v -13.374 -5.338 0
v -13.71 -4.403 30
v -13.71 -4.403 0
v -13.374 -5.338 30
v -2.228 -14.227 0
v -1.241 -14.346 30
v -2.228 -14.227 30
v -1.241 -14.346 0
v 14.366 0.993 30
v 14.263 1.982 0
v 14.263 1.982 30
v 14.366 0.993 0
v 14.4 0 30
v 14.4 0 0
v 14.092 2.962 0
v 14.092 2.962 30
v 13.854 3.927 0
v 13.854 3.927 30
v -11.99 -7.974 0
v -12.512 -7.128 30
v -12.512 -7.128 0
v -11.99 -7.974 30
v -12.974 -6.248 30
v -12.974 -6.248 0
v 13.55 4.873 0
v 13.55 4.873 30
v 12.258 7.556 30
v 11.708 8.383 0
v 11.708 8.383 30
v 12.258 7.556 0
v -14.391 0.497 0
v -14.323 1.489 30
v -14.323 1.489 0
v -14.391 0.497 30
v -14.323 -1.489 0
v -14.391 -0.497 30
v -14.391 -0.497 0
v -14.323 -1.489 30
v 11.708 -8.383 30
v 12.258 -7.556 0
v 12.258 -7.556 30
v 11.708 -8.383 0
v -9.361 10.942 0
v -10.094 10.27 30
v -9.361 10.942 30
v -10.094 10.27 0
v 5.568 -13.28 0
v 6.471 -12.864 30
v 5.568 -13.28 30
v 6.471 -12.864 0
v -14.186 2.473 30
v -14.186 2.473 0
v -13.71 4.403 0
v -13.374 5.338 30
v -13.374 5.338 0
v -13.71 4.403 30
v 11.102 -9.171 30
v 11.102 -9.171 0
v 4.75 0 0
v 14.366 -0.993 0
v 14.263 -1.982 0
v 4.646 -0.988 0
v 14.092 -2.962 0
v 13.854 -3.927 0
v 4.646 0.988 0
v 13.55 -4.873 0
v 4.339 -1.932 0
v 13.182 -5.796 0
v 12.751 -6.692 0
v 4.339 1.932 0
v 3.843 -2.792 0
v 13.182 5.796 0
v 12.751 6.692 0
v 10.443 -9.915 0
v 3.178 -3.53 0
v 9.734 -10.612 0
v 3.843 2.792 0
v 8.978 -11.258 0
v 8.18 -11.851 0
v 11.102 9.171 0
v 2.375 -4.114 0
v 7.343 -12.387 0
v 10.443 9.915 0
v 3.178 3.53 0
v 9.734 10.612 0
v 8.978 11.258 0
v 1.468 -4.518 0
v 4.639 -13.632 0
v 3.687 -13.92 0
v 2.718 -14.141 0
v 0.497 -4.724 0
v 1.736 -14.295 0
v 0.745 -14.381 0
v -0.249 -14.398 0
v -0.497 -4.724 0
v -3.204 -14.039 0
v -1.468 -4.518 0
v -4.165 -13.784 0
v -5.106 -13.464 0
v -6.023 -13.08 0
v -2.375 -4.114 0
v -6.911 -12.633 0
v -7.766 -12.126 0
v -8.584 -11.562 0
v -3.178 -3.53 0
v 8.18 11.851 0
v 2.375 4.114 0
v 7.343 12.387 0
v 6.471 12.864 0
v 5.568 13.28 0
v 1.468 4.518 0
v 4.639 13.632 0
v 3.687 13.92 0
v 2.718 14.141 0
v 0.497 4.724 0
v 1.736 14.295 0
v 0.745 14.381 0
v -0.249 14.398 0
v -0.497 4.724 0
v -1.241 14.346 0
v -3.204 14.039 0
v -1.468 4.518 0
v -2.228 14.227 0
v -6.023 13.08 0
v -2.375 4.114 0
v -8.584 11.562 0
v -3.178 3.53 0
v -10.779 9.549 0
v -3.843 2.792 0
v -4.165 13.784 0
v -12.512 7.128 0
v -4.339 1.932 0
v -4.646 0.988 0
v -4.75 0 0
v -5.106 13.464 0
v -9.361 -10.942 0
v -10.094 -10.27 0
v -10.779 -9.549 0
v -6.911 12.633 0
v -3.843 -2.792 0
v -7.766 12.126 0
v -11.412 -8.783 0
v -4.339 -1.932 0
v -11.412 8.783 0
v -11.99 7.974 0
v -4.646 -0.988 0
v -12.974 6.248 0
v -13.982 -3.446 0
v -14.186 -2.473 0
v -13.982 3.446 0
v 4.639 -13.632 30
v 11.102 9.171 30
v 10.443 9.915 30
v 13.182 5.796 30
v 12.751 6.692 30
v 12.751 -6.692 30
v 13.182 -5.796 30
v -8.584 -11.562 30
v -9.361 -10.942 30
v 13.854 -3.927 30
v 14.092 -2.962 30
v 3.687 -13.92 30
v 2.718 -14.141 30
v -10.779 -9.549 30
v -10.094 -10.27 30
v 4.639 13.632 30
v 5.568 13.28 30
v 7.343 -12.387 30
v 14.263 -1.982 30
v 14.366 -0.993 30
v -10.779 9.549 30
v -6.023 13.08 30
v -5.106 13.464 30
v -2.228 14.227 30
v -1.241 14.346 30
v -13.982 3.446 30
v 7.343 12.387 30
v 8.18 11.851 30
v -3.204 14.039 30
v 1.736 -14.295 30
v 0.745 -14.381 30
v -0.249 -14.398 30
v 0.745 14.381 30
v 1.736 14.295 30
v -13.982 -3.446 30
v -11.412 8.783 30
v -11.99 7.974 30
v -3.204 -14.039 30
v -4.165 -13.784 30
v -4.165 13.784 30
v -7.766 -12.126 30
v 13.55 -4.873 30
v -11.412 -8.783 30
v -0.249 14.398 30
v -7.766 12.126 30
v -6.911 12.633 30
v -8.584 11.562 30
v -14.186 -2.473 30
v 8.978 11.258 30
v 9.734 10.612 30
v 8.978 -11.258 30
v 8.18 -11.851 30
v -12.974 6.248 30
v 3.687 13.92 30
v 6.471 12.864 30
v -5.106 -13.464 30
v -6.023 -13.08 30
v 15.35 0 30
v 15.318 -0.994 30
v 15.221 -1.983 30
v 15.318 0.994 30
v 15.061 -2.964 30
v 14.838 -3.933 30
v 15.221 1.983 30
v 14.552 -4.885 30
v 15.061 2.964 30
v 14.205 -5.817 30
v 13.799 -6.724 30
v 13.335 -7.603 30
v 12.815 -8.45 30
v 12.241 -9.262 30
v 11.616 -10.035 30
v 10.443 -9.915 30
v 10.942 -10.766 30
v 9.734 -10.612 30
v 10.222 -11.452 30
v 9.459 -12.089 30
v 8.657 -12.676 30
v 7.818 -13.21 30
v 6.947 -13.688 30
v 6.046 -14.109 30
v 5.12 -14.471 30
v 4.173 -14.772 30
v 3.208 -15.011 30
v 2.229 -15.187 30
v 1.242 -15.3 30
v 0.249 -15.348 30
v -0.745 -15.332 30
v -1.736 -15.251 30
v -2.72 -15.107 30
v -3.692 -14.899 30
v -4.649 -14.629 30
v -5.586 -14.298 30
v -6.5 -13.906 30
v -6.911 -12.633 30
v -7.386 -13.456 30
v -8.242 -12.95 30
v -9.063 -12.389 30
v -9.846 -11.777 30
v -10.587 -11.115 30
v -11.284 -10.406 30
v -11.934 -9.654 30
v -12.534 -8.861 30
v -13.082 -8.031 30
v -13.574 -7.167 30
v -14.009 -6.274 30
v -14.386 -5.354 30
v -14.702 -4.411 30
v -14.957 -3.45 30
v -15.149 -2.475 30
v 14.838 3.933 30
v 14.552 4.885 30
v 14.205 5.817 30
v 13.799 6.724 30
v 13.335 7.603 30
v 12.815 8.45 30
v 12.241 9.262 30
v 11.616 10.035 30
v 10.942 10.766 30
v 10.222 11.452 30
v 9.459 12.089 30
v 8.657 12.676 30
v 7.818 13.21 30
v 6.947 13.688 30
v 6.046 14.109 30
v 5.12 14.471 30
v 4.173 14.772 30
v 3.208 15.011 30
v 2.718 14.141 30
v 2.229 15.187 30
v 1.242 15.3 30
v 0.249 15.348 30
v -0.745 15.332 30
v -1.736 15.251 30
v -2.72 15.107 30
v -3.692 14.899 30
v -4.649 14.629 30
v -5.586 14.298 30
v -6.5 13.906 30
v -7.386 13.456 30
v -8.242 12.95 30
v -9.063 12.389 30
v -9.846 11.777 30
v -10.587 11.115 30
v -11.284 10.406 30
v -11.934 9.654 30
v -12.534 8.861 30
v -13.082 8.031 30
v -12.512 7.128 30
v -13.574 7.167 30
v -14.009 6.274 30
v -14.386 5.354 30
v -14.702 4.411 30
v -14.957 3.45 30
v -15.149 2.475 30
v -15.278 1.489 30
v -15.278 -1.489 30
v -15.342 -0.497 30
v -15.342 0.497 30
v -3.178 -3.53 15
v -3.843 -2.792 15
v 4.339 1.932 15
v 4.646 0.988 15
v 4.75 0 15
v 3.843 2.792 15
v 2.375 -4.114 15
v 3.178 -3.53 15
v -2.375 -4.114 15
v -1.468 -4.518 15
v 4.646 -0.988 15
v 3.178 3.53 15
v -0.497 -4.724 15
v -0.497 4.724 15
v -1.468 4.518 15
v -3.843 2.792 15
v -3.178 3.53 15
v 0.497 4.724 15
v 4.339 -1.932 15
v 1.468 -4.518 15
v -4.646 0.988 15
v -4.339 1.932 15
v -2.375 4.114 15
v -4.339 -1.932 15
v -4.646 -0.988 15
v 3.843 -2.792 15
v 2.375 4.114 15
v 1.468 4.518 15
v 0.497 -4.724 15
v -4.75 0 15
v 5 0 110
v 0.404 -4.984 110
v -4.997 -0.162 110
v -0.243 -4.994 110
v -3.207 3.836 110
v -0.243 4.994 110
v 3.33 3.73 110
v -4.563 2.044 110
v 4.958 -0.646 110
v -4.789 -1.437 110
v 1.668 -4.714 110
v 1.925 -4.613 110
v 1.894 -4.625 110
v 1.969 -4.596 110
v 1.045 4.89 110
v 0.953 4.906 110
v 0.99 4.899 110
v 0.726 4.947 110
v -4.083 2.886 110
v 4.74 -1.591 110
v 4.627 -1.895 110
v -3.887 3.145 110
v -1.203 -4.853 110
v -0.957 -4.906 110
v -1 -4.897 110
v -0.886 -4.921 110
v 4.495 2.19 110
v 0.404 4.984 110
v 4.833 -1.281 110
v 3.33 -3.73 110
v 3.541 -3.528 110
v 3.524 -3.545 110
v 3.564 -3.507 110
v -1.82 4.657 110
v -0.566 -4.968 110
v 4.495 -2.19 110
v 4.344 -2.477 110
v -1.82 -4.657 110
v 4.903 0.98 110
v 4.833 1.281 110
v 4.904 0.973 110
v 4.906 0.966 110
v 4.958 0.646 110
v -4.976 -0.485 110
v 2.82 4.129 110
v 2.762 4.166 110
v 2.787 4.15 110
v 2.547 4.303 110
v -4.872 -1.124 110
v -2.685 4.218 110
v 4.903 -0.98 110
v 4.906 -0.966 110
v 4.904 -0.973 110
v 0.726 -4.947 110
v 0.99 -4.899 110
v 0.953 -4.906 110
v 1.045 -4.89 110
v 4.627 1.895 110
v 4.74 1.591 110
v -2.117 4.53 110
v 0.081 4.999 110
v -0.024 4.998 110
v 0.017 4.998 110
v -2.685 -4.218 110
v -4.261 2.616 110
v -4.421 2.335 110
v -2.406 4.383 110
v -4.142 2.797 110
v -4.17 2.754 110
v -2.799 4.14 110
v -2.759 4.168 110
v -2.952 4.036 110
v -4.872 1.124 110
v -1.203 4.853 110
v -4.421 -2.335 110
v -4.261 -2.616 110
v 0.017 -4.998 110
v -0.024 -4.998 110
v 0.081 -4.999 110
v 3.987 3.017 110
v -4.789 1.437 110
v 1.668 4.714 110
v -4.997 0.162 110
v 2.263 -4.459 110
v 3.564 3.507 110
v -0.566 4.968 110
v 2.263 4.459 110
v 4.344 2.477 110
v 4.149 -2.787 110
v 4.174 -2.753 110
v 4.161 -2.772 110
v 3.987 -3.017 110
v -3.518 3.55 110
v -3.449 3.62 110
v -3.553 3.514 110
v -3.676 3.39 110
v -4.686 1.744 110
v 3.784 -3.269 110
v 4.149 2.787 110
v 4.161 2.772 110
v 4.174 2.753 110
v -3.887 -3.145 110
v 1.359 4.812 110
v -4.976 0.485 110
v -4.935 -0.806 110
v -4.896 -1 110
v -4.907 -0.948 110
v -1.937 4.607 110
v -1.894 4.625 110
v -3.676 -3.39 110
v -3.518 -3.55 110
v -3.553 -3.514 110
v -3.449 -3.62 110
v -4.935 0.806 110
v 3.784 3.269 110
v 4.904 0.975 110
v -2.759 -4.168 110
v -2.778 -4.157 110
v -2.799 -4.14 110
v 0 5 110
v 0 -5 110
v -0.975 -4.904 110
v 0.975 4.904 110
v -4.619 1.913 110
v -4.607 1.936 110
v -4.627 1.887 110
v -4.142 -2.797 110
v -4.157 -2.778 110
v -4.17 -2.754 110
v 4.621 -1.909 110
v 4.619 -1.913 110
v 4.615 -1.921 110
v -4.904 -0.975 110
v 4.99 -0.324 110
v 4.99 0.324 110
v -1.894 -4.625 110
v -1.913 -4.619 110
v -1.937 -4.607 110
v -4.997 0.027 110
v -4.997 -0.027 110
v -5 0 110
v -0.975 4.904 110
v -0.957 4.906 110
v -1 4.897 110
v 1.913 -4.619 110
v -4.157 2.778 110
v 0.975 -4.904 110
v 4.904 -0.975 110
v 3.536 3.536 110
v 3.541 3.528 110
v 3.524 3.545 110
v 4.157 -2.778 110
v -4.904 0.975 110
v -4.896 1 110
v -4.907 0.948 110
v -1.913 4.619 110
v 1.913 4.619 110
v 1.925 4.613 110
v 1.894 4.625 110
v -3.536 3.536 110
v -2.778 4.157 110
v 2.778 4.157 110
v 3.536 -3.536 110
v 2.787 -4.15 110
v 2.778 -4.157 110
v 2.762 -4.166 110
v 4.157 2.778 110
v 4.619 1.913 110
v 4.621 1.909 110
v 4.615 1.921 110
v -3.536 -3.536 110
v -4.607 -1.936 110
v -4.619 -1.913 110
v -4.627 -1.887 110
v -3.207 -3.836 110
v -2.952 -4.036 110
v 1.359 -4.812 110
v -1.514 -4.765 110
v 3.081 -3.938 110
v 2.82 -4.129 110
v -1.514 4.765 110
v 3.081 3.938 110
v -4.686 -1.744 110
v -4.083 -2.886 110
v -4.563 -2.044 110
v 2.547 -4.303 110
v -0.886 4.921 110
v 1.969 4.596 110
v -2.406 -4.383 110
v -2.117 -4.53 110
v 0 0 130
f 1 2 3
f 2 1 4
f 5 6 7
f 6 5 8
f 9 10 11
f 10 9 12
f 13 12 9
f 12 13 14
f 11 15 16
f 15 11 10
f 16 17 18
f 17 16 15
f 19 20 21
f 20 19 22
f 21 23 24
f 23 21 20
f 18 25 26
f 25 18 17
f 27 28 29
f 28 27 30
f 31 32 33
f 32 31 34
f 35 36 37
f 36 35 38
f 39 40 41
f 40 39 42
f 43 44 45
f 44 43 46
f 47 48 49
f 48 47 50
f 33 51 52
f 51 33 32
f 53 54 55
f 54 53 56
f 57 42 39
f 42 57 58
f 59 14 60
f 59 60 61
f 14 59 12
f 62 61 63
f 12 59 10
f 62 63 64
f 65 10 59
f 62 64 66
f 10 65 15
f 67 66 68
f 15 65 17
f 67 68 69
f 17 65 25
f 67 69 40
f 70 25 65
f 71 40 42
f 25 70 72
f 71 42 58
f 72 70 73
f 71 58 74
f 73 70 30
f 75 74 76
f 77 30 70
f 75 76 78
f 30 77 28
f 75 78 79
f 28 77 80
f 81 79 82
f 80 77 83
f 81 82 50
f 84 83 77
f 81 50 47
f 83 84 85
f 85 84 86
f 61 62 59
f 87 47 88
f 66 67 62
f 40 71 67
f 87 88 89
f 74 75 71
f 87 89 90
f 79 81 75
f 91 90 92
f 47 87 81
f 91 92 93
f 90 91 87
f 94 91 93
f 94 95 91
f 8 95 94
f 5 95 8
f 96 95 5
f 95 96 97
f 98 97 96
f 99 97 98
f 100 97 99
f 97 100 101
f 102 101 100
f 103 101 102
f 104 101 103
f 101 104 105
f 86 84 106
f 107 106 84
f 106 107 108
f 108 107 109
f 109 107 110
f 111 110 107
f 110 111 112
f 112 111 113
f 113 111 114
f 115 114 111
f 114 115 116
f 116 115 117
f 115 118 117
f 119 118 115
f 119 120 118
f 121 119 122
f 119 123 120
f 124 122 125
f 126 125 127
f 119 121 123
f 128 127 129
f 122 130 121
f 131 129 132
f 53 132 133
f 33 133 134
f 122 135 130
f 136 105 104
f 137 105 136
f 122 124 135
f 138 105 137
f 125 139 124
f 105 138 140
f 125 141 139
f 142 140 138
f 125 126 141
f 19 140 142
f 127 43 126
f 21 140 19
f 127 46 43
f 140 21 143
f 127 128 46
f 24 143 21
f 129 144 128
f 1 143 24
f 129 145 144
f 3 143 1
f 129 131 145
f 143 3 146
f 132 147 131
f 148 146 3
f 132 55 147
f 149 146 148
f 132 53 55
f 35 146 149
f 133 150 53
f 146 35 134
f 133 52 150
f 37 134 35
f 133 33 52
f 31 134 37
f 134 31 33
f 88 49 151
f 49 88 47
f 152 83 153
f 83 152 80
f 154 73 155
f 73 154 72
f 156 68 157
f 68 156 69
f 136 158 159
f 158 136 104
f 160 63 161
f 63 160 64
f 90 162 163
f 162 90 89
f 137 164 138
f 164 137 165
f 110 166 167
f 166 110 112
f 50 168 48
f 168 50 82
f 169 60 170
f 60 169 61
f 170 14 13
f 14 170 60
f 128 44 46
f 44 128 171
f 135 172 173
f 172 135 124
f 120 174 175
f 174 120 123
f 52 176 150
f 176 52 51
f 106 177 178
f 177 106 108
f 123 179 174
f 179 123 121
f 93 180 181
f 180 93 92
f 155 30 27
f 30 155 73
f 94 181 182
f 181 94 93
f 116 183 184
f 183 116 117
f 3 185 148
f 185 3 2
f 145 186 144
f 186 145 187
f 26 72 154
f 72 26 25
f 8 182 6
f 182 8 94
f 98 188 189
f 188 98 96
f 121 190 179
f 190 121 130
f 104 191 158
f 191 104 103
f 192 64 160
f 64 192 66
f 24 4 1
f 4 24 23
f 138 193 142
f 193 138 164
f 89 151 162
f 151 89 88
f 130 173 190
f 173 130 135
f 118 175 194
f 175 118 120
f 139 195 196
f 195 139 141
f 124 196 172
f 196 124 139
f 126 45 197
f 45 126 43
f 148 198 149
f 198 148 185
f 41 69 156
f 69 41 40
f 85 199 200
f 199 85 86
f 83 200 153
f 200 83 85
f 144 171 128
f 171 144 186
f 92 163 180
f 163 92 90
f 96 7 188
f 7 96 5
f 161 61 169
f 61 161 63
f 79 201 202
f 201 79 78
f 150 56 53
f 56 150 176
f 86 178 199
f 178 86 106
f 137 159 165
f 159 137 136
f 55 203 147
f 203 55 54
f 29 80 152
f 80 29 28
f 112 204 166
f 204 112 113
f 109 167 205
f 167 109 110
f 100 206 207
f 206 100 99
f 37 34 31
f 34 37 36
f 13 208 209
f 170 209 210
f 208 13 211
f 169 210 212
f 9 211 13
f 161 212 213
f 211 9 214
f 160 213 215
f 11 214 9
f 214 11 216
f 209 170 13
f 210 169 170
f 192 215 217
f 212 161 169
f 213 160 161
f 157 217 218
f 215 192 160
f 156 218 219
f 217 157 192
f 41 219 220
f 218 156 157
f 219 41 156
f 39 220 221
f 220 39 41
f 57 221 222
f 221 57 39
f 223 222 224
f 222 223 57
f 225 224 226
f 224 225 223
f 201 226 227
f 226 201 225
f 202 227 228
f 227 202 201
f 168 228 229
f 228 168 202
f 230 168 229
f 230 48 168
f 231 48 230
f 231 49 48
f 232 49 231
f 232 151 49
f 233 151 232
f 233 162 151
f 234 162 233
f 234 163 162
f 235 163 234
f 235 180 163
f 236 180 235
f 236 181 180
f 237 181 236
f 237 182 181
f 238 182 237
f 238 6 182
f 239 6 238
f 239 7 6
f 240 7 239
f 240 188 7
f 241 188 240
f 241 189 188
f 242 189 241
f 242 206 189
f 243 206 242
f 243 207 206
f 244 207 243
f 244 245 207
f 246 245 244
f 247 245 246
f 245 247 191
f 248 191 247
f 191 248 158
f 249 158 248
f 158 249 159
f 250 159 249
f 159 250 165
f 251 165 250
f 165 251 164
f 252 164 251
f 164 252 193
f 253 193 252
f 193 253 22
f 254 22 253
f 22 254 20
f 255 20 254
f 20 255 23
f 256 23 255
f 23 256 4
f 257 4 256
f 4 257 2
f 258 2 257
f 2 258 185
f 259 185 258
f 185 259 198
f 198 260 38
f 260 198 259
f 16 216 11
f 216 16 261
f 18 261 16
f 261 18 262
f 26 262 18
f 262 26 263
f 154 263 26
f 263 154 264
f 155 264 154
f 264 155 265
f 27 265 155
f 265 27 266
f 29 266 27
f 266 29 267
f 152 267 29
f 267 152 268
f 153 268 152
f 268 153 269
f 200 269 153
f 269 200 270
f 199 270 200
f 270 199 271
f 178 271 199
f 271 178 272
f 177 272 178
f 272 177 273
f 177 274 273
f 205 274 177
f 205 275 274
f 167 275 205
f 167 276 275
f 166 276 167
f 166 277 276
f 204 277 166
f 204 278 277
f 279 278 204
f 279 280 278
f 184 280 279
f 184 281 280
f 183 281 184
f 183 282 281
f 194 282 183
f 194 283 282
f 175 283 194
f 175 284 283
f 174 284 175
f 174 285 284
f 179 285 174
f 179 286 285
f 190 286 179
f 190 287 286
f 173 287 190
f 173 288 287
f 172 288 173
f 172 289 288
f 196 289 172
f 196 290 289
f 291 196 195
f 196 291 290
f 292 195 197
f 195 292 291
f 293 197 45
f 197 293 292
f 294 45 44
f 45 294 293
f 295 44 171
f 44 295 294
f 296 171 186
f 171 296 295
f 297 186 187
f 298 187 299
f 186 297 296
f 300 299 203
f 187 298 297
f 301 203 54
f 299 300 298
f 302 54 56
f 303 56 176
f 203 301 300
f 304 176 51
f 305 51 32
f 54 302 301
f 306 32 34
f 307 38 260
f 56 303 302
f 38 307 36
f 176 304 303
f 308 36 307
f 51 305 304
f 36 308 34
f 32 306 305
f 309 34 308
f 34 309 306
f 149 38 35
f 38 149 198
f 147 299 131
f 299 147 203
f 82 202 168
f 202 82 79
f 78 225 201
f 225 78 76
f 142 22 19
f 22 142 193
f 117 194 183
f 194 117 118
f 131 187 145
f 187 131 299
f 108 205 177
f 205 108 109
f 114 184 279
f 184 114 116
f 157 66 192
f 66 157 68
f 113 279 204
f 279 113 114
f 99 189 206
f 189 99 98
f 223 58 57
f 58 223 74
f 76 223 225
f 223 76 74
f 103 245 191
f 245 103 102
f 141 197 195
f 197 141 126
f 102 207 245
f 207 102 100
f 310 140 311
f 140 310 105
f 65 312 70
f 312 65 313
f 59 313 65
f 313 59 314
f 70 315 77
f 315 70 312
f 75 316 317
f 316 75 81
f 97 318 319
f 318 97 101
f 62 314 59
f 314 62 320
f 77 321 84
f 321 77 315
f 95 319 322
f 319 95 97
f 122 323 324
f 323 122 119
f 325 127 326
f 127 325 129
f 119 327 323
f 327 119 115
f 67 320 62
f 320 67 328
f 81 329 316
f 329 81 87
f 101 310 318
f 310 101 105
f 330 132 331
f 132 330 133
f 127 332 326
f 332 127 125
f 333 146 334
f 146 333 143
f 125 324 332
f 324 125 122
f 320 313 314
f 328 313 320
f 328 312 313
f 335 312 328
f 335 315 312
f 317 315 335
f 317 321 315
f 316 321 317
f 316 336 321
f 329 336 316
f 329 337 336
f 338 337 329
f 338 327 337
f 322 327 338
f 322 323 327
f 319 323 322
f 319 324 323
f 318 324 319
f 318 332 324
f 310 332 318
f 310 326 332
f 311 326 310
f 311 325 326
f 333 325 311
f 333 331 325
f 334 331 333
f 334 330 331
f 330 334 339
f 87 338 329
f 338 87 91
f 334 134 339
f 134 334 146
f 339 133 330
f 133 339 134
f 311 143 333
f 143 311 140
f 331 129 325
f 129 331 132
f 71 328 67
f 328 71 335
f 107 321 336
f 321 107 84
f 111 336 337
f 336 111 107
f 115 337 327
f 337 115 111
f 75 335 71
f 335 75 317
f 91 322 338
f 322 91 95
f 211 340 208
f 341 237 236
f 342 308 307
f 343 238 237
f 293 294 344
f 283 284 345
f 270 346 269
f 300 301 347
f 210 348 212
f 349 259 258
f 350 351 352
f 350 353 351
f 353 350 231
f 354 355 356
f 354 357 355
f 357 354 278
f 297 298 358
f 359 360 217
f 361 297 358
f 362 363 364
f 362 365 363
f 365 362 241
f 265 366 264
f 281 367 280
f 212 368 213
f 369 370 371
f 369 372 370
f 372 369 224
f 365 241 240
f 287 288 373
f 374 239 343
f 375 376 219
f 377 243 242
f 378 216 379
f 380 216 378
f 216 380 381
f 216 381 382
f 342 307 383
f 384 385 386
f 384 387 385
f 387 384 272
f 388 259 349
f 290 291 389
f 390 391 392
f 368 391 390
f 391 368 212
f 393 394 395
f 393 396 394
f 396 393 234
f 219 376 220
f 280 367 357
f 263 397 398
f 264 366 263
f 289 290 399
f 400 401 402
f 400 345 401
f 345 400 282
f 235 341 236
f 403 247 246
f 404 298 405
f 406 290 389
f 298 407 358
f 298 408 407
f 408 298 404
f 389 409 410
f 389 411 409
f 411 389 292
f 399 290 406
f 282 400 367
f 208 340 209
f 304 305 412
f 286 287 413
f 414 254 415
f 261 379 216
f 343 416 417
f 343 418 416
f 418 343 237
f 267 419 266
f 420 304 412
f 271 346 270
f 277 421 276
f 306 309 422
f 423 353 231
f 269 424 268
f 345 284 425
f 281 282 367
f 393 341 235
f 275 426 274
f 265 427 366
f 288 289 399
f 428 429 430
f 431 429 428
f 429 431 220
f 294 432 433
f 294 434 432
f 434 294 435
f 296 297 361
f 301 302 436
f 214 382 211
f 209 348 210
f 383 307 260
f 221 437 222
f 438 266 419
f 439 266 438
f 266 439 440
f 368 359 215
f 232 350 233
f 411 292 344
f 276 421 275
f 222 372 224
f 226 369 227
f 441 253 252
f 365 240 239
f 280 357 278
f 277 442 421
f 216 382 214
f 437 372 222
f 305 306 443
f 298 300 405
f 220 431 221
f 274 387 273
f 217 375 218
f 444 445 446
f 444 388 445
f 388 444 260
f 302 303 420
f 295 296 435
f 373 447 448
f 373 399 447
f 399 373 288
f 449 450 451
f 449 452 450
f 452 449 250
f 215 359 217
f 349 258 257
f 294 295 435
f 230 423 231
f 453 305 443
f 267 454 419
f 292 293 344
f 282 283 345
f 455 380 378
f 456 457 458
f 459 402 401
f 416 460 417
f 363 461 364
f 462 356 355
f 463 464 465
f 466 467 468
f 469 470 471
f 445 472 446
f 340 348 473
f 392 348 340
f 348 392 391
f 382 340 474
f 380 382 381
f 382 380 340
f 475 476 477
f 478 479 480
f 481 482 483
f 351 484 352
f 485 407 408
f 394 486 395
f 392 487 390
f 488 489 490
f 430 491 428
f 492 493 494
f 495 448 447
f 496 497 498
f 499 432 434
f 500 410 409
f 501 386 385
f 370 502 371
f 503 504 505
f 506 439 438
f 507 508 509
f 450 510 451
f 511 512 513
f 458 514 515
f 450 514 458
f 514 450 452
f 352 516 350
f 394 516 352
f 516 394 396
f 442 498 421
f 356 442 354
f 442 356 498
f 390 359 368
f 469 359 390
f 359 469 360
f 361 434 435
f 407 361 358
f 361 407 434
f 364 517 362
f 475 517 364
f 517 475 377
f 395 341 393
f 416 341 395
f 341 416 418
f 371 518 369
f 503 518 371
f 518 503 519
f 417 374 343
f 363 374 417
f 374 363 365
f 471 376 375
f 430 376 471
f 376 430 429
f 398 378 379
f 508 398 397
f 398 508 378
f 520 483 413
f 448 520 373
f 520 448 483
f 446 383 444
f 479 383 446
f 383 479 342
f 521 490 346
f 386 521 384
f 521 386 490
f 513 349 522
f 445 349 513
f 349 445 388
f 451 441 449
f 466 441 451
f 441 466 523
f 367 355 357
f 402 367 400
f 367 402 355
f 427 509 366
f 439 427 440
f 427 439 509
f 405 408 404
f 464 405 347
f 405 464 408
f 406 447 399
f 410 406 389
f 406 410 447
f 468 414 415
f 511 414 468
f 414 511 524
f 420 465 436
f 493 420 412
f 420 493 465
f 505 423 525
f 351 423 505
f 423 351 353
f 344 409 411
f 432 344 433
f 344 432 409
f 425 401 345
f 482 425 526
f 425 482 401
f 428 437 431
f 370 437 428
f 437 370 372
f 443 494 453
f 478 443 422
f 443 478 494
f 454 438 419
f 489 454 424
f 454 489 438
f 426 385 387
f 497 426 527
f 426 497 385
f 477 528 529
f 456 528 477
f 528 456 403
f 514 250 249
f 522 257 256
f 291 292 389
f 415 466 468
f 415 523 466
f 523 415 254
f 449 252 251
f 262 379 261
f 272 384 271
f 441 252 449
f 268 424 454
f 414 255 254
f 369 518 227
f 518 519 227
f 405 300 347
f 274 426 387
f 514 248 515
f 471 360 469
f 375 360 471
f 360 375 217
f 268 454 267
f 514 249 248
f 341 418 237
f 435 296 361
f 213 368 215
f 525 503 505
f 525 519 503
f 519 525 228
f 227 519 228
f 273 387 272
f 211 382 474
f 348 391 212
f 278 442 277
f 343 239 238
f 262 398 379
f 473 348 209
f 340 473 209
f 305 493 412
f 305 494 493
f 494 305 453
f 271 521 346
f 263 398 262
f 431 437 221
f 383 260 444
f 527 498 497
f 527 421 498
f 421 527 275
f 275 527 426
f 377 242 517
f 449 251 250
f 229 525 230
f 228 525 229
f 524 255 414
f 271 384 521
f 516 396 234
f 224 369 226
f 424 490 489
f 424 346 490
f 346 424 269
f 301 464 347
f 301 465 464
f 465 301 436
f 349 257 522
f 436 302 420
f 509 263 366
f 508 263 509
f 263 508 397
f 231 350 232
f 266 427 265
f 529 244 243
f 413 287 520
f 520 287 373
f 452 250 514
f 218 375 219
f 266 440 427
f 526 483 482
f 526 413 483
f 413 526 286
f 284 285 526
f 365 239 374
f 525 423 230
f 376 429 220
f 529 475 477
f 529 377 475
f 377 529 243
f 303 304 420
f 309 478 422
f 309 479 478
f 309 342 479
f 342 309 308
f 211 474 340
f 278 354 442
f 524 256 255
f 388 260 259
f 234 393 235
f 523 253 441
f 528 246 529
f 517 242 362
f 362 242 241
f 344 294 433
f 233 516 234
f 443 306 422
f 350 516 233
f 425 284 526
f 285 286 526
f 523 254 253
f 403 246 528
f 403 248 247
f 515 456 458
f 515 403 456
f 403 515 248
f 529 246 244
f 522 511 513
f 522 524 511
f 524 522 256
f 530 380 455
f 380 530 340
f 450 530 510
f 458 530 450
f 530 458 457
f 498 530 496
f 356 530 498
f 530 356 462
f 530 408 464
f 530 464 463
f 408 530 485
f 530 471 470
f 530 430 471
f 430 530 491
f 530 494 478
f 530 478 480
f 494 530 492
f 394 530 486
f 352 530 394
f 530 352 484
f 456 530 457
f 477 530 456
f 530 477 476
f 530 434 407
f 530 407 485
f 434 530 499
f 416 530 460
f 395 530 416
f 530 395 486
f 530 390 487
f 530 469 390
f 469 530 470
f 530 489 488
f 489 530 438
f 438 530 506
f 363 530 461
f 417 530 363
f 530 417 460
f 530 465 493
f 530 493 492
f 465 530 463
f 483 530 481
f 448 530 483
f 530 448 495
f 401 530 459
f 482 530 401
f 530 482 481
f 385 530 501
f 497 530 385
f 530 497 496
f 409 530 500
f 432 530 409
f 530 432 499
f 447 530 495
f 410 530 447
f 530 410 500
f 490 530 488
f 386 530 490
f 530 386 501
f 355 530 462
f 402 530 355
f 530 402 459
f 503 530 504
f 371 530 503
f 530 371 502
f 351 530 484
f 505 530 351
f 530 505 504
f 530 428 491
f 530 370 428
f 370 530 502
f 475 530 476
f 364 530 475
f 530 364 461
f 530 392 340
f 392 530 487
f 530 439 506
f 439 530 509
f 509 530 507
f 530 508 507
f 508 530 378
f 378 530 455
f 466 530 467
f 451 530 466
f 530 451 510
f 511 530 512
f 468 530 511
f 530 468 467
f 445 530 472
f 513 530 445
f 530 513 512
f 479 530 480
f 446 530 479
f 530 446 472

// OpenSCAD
/* Bi-conic Nose Cone 3D Model Generator
 *
 * NOTE: The performance, safety, and structural integrity of
 *       3D models created using this program are entirely the
 *       responsibility of the user. 
 *
 * NOTE: This is the version without a hollow interior.
 *
 * If 3D printers using PLA, ABS or any other type of low
 * temperature plastic are used to print any models generated by
 * this program, keep in mind that these plastics, especially PLA,
 * become very weak at relatively low temperatures, temperatures
 * as low as the interior of a sunlit car. Even with this in mind,
 * any 3D printed items printed using low temperature 3D printer
 * plastics are intended for use in low power rocketry only and
 * should be printed with a high internal fill and high wall
 * thickness settings (set by the 3D printer application).
 *
 * Some primers and paints can weaken common 3D printed plastics.
 * Do your research before using primers and paints!
 * 
 * If models are printed for mid and high power rocketry
 * applications they should only serve as formers for fiberglass
 * or carbon fiber layup. I have no idea how well PLA or ABS stand
 * up to mold release agents or how well they will adhere to the
 * fiberglass or carbon fiber if the 3D printed model is not
 * extracted and is instead left in place.
 *
 * If there's anything I've said above you don't understand, you
 * shouldn't be creating parts with this program for rockets you 
 * intend to fly.
 *
 * NOTE: All dimensions should be given in MILLIMETERS. All angles should be 
 *       given in DEGREES.
 * 
 * Created by Unknown
 * Created on Unknown
 * Updated on 04-19-2023 by A. Smelser
 */
$fn = 0;
$fa = 0.01;
$fs = 1.0;  // 2 (coarse) to 0.3 (fine)

// Bottom shoulder dimensions 
shl_len = 30;  // Shoulder length
shl_dia = 28.8;  // Shoulder diameter (I.D. of body tube) 

// Bottom shoulder anchor hole dimensions 
anc_dep = 15;  // Anchor hole depth (set to 0 for no hole)
anc_dia = 9.5;  // Anchor hole diameter (set to 0 for no hole)

btm1_dia = 30.7;  // Conical section bottom diameter (O.D. of body tube)
con1_len = 80;  // Set bottom conical section length
top1_dia = 10;  // Set bottom conical section top diameter
con2_len = 20;  // Set top conical section length

// Build nosecone
difference(){
    cylinder(h=shl_len, d=shl_dia);  // create bottom shoulder
    cylinder(h=anc_dep, d=anc_dia);  // create anchor hole
}

union(){
	translate([0, 0, shl_len])
	cylinder(h=con1_len, d1=btm1_dia, d2=top1_dia);  // create bottom cone
	translate([0, 0, shl_len+con1_len])
	cylinder(h=con2_len, d1=top1_dia, d2=0);  // create top cone
}
